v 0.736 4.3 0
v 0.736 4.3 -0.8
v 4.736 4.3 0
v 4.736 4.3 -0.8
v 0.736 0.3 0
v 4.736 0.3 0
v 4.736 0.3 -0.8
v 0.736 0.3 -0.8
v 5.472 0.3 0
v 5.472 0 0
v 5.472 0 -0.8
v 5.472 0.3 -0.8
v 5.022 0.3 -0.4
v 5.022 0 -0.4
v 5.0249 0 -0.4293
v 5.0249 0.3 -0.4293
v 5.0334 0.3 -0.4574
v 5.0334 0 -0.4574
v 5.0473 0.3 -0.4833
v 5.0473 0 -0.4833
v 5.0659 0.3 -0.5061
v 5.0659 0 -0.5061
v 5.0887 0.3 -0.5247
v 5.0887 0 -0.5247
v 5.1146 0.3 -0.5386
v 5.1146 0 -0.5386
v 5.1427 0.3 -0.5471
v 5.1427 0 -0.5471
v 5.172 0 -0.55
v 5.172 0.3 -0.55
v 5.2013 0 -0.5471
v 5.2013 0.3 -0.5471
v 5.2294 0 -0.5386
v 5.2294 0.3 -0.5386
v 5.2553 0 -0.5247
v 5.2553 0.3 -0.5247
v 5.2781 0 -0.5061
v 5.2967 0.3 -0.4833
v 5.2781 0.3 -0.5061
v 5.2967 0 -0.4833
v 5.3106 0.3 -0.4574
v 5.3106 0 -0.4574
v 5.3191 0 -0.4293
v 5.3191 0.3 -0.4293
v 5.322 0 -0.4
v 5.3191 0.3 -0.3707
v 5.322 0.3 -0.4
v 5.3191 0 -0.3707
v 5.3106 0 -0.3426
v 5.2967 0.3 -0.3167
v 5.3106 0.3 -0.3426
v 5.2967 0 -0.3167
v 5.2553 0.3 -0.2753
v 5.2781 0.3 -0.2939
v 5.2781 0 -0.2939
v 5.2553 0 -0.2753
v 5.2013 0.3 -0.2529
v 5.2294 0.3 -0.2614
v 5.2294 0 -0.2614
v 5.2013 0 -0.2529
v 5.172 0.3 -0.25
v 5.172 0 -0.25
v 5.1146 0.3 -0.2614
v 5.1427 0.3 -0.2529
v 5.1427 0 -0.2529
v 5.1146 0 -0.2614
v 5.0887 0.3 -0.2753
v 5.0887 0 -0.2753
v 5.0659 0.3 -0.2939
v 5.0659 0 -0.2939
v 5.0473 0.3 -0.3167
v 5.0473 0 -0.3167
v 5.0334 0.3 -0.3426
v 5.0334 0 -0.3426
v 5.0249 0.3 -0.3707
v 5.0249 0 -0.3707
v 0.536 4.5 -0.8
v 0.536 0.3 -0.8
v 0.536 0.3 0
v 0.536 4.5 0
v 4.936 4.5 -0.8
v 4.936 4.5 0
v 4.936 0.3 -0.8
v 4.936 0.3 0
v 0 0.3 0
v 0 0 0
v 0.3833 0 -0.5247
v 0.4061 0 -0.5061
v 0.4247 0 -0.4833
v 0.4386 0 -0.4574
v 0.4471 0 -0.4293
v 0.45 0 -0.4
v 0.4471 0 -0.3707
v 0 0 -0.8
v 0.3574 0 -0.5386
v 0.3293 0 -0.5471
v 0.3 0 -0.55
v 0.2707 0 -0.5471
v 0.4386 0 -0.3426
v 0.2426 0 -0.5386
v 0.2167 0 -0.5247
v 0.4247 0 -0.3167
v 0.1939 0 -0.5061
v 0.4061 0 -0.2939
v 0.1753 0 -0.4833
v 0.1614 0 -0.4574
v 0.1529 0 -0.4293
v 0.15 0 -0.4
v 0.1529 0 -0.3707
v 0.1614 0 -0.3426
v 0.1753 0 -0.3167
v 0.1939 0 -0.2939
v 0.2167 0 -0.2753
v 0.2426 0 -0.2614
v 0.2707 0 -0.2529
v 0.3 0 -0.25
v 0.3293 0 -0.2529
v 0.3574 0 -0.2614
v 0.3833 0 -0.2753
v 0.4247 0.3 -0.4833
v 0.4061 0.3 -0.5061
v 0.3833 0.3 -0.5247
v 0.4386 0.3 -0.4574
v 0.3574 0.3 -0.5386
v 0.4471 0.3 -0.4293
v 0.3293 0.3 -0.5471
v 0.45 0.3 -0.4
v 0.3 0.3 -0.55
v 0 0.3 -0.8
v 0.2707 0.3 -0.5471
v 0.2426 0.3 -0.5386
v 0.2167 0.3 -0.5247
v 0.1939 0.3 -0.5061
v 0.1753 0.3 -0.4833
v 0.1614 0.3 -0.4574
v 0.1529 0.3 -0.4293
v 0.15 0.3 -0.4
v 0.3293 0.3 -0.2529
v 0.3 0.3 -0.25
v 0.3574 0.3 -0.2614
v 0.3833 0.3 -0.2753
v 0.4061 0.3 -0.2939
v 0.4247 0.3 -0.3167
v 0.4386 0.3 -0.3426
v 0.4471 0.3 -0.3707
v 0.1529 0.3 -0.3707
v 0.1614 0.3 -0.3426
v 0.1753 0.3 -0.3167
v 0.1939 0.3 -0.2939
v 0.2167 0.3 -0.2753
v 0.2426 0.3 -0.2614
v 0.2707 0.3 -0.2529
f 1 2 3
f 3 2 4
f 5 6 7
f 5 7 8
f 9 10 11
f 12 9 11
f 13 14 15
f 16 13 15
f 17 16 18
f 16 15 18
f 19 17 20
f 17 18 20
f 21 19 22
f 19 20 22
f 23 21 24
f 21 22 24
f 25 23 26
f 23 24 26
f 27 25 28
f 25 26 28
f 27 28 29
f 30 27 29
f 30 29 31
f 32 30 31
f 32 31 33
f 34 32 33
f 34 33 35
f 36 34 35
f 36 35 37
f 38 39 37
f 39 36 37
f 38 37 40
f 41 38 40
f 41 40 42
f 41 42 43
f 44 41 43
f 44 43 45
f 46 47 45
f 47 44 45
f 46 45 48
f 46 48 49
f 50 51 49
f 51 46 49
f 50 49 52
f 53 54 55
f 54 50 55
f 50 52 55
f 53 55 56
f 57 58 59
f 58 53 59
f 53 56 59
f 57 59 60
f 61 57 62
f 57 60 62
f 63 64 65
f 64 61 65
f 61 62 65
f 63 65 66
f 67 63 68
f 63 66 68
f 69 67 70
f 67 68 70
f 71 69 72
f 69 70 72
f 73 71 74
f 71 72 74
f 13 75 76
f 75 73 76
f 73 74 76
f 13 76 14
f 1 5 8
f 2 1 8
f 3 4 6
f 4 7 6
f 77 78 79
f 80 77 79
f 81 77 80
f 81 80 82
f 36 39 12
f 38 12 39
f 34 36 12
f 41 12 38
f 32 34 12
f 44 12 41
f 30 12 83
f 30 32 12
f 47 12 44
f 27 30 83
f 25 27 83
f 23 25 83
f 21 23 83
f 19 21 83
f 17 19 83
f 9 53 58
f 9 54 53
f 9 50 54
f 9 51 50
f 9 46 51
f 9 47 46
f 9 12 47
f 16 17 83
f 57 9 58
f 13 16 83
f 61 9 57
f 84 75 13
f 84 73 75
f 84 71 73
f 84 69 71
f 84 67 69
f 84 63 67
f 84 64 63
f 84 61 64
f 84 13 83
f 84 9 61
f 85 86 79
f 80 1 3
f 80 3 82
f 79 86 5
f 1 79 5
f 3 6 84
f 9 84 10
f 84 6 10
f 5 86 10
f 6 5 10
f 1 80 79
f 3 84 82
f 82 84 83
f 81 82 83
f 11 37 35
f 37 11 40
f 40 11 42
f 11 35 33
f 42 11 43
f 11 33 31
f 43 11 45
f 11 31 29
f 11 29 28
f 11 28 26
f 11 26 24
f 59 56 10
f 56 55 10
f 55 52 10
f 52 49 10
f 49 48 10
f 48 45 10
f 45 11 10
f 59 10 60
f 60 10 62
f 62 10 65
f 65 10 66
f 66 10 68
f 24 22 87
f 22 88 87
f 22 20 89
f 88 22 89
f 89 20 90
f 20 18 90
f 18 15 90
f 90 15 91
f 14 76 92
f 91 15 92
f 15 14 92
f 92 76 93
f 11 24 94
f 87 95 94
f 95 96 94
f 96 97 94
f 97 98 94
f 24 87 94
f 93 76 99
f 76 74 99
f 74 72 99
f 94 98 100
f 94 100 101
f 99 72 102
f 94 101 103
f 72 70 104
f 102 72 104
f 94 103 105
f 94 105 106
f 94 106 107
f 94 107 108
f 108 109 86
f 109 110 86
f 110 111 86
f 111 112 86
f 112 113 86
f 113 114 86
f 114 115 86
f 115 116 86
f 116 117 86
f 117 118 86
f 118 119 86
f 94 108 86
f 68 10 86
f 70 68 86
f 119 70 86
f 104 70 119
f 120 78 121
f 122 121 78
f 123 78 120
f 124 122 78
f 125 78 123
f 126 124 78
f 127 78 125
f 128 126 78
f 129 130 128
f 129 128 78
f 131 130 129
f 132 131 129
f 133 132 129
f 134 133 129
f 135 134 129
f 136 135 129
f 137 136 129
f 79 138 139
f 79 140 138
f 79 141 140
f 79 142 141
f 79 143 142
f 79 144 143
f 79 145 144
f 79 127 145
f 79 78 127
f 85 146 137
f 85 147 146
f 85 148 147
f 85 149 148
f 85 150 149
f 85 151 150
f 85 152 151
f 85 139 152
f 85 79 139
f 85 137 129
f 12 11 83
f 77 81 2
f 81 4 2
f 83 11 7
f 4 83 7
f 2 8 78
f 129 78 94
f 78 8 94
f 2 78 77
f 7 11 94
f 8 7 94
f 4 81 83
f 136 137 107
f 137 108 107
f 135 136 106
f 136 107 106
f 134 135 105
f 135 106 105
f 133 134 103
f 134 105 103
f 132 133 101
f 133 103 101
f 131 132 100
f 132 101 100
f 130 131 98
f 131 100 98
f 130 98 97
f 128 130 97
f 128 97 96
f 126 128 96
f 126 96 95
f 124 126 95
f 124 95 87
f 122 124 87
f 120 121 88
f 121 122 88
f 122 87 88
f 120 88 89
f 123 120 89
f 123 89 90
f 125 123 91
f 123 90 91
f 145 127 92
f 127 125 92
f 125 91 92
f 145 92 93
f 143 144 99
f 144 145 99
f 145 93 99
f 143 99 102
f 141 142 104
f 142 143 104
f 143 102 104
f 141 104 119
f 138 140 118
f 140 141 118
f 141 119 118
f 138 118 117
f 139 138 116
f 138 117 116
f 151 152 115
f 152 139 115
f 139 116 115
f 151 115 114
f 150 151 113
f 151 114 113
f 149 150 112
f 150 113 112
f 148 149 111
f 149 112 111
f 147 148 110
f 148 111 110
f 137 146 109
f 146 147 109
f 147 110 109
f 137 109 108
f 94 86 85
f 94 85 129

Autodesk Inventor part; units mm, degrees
ref_plane "YZ Plane" through (0, 0, 0) normal (1, 0, 0) x (0, 1, 0)
ref_plane "XZ Plane" through (0, 0, 0) normal (0, 1, 0) x (-1, 0, 0)
ref_plane "XY Plane" through (0, 0, 0) normal (0, 0, 1) x (1, 0, 0)
sketch "Boceto1" plane through (0, 0, 0) normal (0, 1, 0) x (-1, 0, 0)
  circle A0 centre (-5.172, -0.4) radius 0.15
  circle A1 centre (-0.3, -0.4) radius 0.15
  line L0 (-5.472, 0) -> (-5.472, -0.8)
  line L1 (0, 0) -> (0, -0.8)
  line L2 (0, 0) -> (-5.472, 0)
  line L3 (-4.736, -0.8) -> (-4.936, -0.8)
  line L4 (-4.736, 0) -> (-4.936, 0)
  line L5 (-4.936, -0.8) -> (-4.936, -1)
  line L6 (-4.936, -1) -> (-0.536, -1)
  line L7 (-0.536, -1) -> (-0.536, -0.8)
  line L8 (0, -0.8) -> (-0.536, -0.8)
  line L9 (-4.936, -0.8) -> (-5.472, -0.8)
  dimension "d1" = 1
extrude "Extrusión1" add sketch "Boceto1" along normal blind 0.3
sketch "Boceto2" plane through (0, 0.3, 0) normal (0, 1, 0) x (1, 0, 0)
  line L0 (4.936, 1) -> (0.536, 1) projected
  line L1 (0.536, 1) -> (0.536, 0)
  line L2 (0.536, 0) -> (0.736, 0)
  line L3 (0.736, 0) -> (0.736, 0.8)
  line L4 (0.736, 0.8) -> (4.736, 0.8)
  line L5 (4.736, 0.8) -> (4.736, 0)
  line L6 (4.736, 0) -> (4.936, 0)
  line L7 (4.936, 0) -> (4.936, 1)
  line L8 (0.536, 1) -> (0.536, 0.8) projected
  line L9 (4.936, 1) -> (0.536, 1)
  dimension "d5" = 0.2
  dimension "d6" = 4
extrude "Extrusión2" add sketch "Boceto2" along normal blind 4
sketch "Boceto3" plane through (0, 4.3, 0) normal (0, 1, 0) x (1, 0, 0)
  line L0 (0.536, 1) -> (0.536, 0) projected
  line L1 (4.936, 1) -> (0.536, 1) projected
  line L2 (0.536, 0) -> (4.936, 0)
  line L3 (4.936, 0) -> (4.936, 1)
  line L4 (4.936, 1) -> (0.536, 1)
  line L5 (0.536, 1) -> (0.536, 0)
  point P0 (0, 0)
extrude "Extrusión3" add sketch "Boceto3" along normal blind 0.2
sketch "Boceto5" plane through (0, 0, 0) normal (0, -1, 0) x (1, 0, 0)
  circle A0 centre (0.3, -0.4) radius 0.15 projected
  circle A1 centre (5.172, -0.4) radius 0.15 projected
  line L0 (5.472, 0) -> (5.472, -0.8) projected
  line L1 (0, 0) -> (5.472, 0) projected
  line L2 (0, -0.8) -> (0, 0) projected
  line L3 (0.536, -0.8) -> (0, -0.8) projected
  line L4 (0.536, -1) -> (0.536, -0.8) projected
  line L5 (4.936, -1) -> (0.536, -1) projected
  line L6 (4.936, -0.8) -> (4.936, -1) projected
  line L7 (5.472, -0.8) -> (4.936, -0.8) projected
  line L8 (4.936, -0.8) -> (0.536, -0.8)
  line L9 (0.536, -0.8) -> (0.536, -1)
  line L10 (0.536, -1) -> (4.936, -1)
  line L11 (4.936, -1) -> (4.936, -0.8)
extrude "Extrusión5" cut sketch "Boceto5" against normal blind 20 contours L6 L5 L4 L8
properties part number "soporteMatrizInferior"
